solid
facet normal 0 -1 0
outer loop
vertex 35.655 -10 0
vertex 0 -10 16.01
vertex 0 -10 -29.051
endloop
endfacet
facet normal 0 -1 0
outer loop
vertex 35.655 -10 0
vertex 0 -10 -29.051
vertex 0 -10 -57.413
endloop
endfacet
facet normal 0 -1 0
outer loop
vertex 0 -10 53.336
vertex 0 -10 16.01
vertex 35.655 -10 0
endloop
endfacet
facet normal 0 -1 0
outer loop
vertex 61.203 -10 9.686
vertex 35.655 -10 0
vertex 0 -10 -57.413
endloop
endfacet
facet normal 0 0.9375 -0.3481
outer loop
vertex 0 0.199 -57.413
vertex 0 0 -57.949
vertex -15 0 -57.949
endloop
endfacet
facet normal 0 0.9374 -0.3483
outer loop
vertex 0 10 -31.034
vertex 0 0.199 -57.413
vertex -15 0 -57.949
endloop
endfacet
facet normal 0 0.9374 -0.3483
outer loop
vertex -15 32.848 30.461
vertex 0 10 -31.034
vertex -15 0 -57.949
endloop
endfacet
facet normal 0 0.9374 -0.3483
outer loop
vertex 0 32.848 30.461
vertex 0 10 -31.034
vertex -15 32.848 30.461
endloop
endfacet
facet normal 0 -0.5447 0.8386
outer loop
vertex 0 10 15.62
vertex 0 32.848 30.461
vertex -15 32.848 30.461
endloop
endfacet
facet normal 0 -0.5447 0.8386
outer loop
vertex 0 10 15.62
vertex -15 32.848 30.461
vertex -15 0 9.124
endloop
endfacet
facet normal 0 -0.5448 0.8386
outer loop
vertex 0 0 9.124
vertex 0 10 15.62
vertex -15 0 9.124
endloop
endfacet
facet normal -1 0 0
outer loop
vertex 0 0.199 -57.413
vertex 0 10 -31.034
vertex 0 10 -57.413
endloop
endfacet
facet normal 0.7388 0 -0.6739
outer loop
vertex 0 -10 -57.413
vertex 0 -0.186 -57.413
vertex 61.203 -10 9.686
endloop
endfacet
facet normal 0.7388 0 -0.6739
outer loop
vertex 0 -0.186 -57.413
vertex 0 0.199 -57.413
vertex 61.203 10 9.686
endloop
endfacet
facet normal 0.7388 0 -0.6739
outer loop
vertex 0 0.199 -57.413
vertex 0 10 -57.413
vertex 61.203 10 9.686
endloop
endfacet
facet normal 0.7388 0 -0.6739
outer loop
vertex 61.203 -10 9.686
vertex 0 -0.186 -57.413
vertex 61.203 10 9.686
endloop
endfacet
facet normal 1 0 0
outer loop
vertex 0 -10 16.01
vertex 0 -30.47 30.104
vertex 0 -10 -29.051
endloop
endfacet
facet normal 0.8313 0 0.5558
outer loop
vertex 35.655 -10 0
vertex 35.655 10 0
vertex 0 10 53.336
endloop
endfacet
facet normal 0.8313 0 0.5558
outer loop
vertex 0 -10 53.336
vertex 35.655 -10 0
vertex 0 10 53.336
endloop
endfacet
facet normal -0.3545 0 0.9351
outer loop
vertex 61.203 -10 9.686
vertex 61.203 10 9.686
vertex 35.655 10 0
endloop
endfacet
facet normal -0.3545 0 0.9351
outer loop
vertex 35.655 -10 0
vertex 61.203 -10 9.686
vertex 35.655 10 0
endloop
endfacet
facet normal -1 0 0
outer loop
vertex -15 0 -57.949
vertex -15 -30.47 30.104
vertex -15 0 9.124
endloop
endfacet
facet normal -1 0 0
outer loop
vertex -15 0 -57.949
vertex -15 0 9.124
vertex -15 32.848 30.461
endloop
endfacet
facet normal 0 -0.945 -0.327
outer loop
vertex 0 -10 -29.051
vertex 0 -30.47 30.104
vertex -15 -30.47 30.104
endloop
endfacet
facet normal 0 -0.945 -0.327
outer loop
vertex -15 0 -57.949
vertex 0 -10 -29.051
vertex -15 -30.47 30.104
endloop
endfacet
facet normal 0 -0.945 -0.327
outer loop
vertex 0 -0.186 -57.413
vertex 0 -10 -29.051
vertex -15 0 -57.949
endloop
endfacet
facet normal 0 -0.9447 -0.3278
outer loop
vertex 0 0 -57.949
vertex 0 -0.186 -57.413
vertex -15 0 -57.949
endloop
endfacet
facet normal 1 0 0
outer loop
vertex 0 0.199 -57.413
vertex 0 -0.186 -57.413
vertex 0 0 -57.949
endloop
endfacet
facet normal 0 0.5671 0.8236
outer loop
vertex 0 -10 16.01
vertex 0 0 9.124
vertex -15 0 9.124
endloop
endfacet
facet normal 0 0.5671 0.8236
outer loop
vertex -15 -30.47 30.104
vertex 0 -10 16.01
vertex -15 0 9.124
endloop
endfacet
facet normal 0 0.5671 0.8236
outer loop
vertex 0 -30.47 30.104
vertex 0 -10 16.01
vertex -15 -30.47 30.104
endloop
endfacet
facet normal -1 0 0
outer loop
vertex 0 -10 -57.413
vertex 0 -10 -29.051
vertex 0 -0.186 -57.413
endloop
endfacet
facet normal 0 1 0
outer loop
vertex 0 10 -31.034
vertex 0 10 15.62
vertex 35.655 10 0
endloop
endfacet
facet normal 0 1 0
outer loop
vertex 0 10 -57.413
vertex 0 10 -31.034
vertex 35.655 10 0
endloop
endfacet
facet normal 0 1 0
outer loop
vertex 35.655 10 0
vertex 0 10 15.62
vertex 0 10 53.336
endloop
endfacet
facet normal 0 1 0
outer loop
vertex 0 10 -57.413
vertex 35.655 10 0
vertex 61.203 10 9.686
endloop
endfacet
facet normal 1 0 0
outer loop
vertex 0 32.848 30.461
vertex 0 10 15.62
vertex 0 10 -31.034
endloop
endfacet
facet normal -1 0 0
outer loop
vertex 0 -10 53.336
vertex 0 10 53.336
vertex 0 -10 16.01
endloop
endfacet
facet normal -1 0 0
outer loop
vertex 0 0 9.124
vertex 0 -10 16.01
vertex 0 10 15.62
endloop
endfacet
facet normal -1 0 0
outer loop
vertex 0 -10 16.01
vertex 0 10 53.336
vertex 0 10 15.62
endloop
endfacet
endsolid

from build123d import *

# Parameters (mm, degrees)
F2_DEPTH      = 15
F3_DEPTH      = 10
F3_DEPTH_BACK = 10


# Not quite as in the source:
# - a feature names something its author has since deleted; it is built from what else it names


with BuildPart() as f2:
    # F1 (on Right) → F2 (new body)
    with BuildSketch(Plane.YZ):
        Polygon((32.8475944698, 30.4612312466), (0, 9.1243321076), (-30.4703023285, 30.1044266671), (0, -57.9494014382), align=None)
    extrude(amount=-F2_DEPTH)

    # F0 (on Front) → F3 (join, two sides)
    with BuildSketch(Plane.XZ) as f3_sk:
        Polygon((35.6550849974, 0), (0, 53.336199373), (0, -57.4131049216), (61.2032115459, 9.6858292818), align=None)
    extrude(amount=-F3_DEPTH)
    extrude(f3_sk.sketch, amount=F3_DEPTH_BACK)


solid = f2.part
